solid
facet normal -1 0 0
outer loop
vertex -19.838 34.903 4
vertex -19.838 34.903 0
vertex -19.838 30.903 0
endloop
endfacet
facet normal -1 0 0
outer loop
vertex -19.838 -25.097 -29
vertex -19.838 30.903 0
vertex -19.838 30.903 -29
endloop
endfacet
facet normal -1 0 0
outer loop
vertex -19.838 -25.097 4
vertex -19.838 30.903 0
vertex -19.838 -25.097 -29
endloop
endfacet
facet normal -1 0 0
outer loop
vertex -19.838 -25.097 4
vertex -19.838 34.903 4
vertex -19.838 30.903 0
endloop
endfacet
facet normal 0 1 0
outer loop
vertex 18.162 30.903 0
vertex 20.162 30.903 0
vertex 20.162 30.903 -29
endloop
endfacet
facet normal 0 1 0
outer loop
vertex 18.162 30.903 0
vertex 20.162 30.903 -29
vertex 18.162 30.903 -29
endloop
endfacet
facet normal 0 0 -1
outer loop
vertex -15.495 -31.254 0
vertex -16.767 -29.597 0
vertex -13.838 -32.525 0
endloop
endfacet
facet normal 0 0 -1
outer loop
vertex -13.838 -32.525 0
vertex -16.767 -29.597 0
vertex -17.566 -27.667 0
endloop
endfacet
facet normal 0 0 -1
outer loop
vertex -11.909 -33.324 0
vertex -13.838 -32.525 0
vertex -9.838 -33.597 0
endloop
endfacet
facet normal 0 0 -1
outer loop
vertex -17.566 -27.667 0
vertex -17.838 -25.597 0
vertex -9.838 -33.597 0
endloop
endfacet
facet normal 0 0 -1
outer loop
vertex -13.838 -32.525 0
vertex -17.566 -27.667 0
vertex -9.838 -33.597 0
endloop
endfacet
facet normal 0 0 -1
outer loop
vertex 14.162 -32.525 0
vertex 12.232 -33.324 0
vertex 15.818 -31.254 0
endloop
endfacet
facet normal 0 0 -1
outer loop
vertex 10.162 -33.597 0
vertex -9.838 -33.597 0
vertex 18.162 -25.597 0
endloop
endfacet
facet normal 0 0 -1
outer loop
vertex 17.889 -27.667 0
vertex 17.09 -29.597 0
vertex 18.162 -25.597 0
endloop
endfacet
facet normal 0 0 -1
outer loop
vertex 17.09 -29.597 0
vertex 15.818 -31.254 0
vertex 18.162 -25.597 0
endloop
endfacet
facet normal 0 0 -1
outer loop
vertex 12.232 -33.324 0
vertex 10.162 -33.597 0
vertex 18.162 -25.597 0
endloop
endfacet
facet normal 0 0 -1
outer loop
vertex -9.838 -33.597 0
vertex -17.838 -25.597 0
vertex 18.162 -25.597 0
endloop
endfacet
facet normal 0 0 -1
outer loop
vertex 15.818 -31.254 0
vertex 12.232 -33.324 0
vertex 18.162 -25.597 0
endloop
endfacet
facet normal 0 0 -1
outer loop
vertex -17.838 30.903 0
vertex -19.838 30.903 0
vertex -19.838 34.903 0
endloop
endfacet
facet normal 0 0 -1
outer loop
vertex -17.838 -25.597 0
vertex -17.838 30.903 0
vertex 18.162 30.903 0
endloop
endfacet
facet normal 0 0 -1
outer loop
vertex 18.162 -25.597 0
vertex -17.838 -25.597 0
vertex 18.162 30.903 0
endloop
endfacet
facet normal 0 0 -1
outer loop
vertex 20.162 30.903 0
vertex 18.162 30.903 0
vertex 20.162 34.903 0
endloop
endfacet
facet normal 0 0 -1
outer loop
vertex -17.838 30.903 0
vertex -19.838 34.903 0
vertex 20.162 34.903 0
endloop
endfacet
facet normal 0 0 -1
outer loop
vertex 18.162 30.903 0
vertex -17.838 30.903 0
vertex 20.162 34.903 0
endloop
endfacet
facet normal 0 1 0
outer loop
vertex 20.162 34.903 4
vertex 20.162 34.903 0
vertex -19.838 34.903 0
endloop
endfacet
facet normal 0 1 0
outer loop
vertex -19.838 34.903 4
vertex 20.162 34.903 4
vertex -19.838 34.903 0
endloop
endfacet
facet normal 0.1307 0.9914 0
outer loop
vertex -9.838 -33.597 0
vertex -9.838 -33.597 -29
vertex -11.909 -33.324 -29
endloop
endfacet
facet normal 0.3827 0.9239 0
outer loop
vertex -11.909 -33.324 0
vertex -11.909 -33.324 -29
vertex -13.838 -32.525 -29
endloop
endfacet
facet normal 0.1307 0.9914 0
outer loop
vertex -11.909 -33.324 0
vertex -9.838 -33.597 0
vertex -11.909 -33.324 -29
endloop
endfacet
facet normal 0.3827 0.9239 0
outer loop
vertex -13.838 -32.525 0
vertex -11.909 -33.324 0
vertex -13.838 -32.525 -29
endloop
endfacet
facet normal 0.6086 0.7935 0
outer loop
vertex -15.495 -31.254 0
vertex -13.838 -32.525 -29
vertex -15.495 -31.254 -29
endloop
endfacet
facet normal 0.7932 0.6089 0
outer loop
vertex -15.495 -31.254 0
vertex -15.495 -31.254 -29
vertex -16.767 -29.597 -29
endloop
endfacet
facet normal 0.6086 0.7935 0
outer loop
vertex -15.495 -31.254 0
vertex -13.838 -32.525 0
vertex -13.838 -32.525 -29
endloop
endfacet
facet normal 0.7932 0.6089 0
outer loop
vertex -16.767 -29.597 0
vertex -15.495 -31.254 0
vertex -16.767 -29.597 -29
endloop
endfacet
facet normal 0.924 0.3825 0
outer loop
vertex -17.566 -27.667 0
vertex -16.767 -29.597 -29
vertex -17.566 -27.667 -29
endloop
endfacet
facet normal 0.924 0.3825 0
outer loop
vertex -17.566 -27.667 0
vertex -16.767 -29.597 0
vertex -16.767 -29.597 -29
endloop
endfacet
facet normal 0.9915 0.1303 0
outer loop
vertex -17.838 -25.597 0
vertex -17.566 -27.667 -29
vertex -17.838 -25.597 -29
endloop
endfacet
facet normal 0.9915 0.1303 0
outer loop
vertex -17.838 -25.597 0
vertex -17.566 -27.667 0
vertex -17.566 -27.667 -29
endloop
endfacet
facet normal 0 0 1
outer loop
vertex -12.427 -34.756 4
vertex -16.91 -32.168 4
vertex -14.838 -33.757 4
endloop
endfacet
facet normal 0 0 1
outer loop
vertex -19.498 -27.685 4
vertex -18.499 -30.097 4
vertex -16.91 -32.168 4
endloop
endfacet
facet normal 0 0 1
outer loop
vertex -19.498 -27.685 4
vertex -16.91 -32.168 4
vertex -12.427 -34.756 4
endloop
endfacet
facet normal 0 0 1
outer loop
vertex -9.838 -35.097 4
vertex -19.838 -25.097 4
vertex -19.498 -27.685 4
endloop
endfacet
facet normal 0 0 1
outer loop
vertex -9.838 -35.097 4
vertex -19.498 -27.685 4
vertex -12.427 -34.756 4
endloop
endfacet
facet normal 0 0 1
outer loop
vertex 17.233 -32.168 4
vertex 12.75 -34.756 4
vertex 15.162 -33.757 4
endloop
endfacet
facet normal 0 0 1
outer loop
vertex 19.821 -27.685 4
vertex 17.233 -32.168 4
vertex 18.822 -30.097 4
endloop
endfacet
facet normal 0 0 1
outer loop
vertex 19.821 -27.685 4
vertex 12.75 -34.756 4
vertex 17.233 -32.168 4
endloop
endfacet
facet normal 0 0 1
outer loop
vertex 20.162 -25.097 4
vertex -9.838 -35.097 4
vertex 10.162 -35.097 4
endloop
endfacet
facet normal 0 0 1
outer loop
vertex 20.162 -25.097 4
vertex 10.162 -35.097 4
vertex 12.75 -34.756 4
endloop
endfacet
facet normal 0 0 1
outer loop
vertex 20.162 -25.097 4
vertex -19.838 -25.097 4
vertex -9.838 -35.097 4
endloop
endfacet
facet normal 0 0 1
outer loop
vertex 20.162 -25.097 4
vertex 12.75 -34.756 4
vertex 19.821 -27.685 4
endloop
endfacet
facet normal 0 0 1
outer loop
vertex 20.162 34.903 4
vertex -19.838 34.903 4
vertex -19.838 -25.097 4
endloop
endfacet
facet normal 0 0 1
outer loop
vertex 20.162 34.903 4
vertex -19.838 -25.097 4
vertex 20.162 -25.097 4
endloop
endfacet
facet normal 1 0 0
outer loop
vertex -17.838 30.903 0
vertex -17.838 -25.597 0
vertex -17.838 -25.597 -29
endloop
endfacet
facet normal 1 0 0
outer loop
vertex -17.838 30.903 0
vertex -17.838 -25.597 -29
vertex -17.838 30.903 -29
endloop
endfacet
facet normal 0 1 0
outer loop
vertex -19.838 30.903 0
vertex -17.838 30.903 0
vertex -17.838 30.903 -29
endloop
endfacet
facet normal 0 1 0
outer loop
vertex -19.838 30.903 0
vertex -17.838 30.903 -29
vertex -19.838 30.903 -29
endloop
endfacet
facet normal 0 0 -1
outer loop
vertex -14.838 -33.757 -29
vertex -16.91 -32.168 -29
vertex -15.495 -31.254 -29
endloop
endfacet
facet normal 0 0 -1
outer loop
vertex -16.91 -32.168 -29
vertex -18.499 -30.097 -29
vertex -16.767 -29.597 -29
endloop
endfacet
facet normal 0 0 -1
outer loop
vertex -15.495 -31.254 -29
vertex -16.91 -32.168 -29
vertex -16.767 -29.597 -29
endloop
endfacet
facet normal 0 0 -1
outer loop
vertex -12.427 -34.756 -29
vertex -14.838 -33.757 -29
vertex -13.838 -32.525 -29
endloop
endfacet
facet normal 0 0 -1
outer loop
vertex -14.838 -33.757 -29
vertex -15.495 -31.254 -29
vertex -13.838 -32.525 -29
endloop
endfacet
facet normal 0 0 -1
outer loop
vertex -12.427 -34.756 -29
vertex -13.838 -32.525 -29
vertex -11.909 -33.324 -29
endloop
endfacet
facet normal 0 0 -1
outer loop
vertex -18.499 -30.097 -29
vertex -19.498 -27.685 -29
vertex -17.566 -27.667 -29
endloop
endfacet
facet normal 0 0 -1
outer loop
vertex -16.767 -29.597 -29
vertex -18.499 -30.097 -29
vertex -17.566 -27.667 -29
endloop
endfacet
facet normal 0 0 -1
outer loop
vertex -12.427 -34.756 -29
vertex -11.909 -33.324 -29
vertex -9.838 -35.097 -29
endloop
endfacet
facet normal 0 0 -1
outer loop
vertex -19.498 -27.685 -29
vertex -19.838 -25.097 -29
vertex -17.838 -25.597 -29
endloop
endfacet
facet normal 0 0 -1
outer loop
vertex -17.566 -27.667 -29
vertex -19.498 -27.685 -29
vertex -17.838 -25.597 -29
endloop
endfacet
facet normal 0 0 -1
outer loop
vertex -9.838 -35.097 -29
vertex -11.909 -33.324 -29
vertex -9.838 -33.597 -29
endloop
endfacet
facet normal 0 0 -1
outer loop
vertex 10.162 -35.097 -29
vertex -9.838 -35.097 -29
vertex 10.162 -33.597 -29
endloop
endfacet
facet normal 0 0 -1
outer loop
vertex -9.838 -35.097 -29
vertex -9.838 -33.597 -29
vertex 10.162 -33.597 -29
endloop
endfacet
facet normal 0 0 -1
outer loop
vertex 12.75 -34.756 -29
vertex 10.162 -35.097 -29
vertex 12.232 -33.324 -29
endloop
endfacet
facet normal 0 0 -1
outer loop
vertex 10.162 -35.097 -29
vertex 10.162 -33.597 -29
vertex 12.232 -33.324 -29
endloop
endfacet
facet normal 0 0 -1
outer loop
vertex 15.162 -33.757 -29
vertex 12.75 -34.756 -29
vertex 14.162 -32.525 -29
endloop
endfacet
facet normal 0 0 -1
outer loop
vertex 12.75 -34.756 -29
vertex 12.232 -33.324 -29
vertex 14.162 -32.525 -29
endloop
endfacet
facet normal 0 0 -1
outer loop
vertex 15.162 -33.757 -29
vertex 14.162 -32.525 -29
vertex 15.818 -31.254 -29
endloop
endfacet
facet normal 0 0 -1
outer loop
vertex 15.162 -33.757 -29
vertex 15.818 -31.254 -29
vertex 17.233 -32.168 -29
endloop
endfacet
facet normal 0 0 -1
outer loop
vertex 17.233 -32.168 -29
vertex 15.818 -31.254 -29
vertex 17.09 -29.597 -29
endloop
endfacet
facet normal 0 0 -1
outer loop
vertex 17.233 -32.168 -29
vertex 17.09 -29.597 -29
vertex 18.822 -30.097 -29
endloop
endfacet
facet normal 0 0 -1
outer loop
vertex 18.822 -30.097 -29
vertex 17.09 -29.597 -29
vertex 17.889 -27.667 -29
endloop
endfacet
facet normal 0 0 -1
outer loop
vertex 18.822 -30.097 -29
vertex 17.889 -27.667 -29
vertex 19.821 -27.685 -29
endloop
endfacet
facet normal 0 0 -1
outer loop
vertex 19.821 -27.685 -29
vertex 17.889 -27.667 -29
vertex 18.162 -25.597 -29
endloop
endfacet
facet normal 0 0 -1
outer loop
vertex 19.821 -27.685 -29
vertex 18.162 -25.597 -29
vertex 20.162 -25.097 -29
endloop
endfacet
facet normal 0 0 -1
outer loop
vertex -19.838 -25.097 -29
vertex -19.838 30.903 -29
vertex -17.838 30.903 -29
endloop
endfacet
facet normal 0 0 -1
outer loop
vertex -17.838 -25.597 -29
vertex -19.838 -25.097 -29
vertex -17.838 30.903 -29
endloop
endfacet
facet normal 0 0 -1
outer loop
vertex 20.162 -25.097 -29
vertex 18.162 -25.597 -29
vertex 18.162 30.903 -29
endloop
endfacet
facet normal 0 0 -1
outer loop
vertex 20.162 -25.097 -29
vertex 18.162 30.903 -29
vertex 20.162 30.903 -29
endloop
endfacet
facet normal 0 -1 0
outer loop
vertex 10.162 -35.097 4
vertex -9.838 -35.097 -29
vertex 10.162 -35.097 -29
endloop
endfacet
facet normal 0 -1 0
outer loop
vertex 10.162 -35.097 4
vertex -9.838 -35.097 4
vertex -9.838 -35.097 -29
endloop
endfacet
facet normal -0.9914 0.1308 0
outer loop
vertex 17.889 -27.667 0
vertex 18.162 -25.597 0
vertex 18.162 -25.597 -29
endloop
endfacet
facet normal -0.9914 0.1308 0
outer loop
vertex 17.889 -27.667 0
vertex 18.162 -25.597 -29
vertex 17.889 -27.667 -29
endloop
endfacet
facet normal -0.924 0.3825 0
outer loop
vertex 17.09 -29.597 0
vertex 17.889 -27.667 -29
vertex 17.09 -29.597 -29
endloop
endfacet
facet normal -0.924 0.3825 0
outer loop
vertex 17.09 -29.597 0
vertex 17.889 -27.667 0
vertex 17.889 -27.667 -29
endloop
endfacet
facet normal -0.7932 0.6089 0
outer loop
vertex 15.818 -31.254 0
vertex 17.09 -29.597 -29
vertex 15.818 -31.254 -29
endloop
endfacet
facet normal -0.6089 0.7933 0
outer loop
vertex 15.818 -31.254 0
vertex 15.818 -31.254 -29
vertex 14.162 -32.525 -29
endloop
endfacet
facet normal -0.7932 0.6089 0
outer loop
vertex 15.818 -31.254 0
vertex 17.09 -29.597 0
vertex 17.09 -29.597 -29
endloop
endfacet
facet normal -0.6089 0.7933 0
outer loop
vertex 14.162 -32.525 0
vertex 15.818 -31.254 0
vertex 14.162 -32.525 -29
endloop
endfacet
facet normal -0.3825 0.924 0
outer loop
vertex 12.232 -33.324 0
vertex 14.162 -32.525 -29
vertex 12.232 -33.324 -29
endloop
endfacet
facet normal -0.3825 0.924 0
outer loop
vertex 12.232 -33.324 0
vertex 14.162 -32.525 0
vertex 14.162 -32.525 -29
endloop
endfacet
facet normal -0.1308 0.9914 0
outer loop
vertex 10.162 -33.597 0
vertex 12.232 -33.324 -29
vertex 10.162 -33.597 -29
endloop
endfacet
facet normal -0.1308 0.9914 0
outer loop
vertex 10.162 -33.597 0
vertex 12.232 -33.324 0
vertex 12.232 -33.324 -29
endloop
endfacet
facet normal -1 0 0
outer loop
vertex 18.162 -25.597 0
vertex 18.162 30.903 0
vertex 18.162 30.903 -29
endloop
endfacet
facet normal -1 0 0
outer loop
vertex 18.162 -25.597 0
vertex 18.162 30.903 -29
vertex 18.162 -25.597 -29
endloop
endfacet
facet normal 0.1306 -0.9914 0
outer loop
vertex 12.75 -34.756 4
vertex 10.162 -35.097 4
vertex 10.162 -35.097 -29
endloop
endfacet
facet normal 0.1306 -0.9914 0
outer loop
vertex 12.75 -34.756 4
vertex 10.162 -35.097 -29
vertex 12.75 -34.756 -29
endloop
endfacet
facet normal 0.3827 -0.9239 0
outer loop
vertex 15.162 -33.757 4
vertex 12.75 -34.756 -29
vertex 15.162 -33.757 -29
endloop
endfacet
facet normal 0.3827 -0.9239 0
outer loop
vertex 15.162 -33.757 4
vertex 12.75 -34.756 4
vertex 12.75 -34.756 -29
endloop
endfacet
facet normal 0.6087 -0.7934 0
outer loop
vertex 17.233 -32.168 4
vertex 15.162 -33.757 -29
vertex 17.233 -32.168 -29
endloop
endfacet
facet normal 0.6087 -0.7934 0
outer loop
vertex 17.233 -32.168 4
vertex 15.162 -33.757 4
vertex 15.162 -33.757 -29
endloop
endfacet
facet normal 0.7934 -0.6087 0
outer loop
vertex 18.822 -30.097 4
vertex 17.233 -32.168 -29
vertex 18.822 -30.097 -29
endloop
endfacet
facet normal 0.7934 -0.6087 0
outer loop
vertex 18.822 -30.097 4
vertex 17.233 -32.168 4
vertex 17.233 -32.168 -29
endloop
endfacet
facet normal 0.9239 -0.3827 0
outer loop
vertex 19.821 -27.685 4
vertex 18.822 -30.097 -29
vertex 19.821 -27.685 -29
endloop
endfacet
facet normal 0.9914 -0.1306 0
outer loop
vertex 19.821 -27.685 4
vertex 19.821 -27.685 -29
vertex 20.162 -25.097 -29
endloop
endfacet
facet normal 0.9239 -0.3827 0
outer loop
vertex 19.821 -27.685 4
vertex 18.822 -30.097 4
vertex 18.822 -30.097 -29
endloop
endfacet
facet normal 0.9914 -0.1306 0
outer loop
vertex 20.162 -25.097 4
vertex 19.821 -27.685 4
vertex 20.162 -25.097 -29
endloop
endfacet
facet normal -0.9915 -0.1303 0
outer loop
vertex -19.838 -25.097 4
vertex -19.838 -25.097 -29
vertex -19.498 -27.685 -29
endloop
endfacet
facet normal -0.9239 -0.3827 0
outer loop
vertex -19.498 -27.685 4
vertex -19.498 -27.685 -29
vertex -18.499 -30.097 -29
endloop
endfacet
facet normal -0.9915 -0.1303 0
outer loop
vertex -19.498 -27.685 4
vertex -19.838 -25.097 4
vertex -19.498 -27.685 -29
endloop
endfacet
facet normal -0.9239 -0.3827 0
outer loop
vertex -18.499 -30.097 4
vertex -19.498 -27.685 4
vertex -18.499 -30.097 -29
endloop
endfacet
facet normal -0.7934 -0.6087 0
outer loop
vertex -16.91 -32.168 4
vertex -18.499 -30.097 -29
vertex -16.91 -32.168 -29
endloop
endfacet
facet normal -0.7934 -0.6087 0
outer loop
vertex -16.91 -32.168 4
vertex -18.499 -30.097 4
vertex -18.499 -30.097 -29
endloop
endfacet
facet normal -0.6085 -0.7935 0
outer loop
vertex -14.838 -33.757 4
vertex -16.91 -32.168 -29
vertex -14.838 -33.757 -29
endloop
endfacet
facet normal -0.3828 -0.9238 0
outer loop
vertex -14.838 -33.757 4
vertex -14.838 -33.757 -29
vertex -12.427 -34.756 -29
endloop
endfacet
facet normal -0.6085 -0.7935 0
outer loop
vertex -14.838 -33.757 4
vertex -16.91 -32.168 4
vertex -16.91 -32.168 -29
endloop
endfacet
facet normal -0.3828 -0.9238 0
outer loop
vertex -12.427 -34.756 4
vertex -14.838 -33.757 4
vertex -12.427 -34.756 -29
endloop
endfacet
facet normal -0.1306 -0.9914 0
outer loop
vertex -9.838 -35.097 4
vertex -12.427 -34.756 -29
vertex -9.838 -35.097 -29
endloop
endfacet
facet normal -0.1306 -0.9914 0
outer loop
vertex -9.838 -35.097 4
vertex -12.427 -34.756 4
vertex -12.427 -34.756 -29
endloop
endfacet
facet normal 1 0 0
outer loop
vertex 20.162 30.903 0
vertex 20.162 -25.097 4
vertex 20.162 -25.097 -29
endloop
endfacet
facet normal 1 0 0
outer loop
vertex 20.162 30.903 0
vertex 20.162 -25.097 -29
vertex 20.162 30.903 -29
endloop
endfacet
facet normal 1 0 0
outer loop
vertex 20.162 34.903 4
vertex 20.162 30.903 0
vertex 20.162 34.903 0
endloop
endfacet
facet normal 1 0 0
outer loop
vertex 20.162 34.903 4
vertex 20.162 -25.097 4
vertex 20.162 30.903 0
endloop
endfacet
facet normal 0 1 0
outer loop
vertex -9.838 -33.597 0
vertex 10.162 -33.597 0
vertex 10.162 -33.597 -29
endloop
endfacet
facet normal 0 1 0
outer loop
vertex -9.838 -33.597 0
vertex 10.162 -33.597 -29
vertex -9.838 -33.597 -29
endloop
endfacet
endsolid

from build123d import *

# Parameters (mm, degrees)
F1_DEPTH = 4
F2_DEPTH = 29


with BuildPart() as f1:
    # F0 (on Top) → F1 (new body)
    with BuildSketch(Plane.XY):
        with BuildLine():
            Line((-9.838484, -35.096727), (10.161516, -35.096727))
            ThreePointArc((10.161516, -35.096727), (17.232584, -32.167795), (20.161516, -25.096727))
            Line((20.161516, -25.096727), (20.161516, 30.903273))
            Line((20.161516, 30.903273), (18.161516, 30.903273))
            Line((18.161516, 30.903273), (18.161516, -25.596727))
            ThreePointArc((18.161516, -25.596727), (15.81837, -31.253582), (10.161516, -33.596727))
            Line((10.161516, -33.596727), (-9.838484, -33.596727))
            ThreePointArc((-9.838484, -33.596727), (-15.495338, -31.253582), (-17.838484, -25.596727))
            Line((-17.838484, -25.596727), (-17.838484, 30.903273))
            Line((-17.838484, 30.903273), (-19.838484, 30.903273))
            Line((-19.838484, 30.903273), (-19.838484, -25.096727))
            ThreePointArc((-19.838484, -25.096727), (-16.909552, -32.167795), (-9.838484, -35.096727))
        make_face()
        Polygon((18.161516, 30.903273), (20.161516, 30.903273), (20.161516, 34.903273), (-19.838484, 34.903273), (-19.838484, 30.903273), (-17.838484, 30.903273), (-16.838484, 30.903273), (-14.838484, 30.903273), (15.161516, 30.903273), (17.161516, 30.903273), align=None)
        with BuildLine():
            Line((18.161516, -25.596727), (18.161516, 30.903273))
            Line((18.161516, 30.903273), (17.161516, 30.903273))
            Line((17.161516, 30.903273), (17.161516, -25.596727))
            ThreePointArc((17.161516, -25.596727), (15.111263, -30.546475), (10.161516, -32.596727))
            Line((10.161516, -32.596727), (-9.838484, -32.596727))
            ThreePointArc((-9.838484, -32.596727), (-14.788231, -30.546475), (-16.838484, -25.596727))
            Line((-16.838484, -25.596727), (-16.838484, 30.903273))
            Line((-16.838484, 30.903273), (-17.838484, 30.903273))
            Line((-17.838484, 30.903273), (-17.838484, -25.596727))
            ThreePointArc((-17.838484, -25.596727), (-15.495338, -31.253582), (-9.838484, -33.596727))
            Line((-9.838484, -33.596727), (10.161516, -33.596727))
            ThreePointArc((10.161516, -33.596727), (15.81837, -31.253582), (18.161516, -25.596727))
        make_face()
        with BuildLine():
            Line((15.161516, -25.596727), (15.161516, 30.903273))
            Line((15.161516, 30.903273), (-14.838484, 30.903273))
            Line((-14.838484, 30.903273), (-14.838484, -25.596727))
            ThreePointArc((-14.838484, -25.596727), (-13.374018, -29.132261), (-9.838484, -30.596727))
            Line((-9.838484, -30.596727), (10.161516, -30.596727))
            ThreePointArc((10.161516, -30.596727), (13.69705, -29.132261), (15.161516, -25.596727))
        make_face()
        with BuildLine():
            Line((17.161516, -25.596727), (17.161516, 30.903273))
            Line((17.161516, 30.903273), (15.161516, 30.903273))
            Line((15.161516, 30.903273), (15.161516, -25.596727))
            ThreePointArc((15.161516, -25.596727), (13.69705, -29.132261), (10.161516, -30.596727))
            Line((10.161516, -30.596727), (-9.838484, -30.596727))
            ThreePointArc((-9.838484, -30.596727), (-13.374018, -29.132261), (-14.838484, -25.596727))
            Line((-14.838484, -25.596727), (-14.838484, 30.903273))
            Line((-14.838484, 30.903273), (-16.838484, 30.903273))
            Line((-16.838484, 30.903273), (-16.838484, -25.596727))
            ThreePointArc((-16.838484, -25.596727), (-14.788231, -30.546475), (-9.838484, -32.596727))
            Line((-9.838484, -32.596727), (10.161516, -32.596727))
            ThreePointArc((10.161516, -32.596727), (15.111263, -30.546475), (17.161516, -25.596727))
        make_face()
    extrude(amount=F1_DEPTH)

    # F0 (on Top) → F2 (join)
    with BuildSketch(Plane.XY):
        with BuildLine():
            Line((-9.838484, -35.096727), (10.161516, -35.096727))
            ThreePointArc((10.161516, -35.096727), (17.232584, -32.167795), (20.161516, -25.096727))
            Line((20.161516, -25.096727), (20.161516, 30.903273))
            Line((20.161516, 30.903273), (18.161516, 30.903273))
            Line((18.161516, 30.903273), (18.161516, -25.596727))
            ThreePointArc((18.161516, -25.596727), (15.81837, -31.253582), (10.161516, -33.596727))
            Line((10.161516, -33.596727), (-9.838484, -33.596727))
            ThreePointArc((-9.838484, -33.596727), (-15.495338, -31.253582), (-17.838484, -25.596727))
            Line((-17.838484, -25.596727), (-17.838484, 30.903273))
            Line((-17.838484, 30.903273), (-19.838484, 30.903273))
            Line((-19.838484, 30.903273), (-19.838484, -25.096727))
            ThreePointArc((-19.838484, -25.096727), (-16.909552, -32.167795), (-9.838484, -35.096727))
        make_face()
    extrude(amount=-F2_DEPTH)


solid = f1.part
